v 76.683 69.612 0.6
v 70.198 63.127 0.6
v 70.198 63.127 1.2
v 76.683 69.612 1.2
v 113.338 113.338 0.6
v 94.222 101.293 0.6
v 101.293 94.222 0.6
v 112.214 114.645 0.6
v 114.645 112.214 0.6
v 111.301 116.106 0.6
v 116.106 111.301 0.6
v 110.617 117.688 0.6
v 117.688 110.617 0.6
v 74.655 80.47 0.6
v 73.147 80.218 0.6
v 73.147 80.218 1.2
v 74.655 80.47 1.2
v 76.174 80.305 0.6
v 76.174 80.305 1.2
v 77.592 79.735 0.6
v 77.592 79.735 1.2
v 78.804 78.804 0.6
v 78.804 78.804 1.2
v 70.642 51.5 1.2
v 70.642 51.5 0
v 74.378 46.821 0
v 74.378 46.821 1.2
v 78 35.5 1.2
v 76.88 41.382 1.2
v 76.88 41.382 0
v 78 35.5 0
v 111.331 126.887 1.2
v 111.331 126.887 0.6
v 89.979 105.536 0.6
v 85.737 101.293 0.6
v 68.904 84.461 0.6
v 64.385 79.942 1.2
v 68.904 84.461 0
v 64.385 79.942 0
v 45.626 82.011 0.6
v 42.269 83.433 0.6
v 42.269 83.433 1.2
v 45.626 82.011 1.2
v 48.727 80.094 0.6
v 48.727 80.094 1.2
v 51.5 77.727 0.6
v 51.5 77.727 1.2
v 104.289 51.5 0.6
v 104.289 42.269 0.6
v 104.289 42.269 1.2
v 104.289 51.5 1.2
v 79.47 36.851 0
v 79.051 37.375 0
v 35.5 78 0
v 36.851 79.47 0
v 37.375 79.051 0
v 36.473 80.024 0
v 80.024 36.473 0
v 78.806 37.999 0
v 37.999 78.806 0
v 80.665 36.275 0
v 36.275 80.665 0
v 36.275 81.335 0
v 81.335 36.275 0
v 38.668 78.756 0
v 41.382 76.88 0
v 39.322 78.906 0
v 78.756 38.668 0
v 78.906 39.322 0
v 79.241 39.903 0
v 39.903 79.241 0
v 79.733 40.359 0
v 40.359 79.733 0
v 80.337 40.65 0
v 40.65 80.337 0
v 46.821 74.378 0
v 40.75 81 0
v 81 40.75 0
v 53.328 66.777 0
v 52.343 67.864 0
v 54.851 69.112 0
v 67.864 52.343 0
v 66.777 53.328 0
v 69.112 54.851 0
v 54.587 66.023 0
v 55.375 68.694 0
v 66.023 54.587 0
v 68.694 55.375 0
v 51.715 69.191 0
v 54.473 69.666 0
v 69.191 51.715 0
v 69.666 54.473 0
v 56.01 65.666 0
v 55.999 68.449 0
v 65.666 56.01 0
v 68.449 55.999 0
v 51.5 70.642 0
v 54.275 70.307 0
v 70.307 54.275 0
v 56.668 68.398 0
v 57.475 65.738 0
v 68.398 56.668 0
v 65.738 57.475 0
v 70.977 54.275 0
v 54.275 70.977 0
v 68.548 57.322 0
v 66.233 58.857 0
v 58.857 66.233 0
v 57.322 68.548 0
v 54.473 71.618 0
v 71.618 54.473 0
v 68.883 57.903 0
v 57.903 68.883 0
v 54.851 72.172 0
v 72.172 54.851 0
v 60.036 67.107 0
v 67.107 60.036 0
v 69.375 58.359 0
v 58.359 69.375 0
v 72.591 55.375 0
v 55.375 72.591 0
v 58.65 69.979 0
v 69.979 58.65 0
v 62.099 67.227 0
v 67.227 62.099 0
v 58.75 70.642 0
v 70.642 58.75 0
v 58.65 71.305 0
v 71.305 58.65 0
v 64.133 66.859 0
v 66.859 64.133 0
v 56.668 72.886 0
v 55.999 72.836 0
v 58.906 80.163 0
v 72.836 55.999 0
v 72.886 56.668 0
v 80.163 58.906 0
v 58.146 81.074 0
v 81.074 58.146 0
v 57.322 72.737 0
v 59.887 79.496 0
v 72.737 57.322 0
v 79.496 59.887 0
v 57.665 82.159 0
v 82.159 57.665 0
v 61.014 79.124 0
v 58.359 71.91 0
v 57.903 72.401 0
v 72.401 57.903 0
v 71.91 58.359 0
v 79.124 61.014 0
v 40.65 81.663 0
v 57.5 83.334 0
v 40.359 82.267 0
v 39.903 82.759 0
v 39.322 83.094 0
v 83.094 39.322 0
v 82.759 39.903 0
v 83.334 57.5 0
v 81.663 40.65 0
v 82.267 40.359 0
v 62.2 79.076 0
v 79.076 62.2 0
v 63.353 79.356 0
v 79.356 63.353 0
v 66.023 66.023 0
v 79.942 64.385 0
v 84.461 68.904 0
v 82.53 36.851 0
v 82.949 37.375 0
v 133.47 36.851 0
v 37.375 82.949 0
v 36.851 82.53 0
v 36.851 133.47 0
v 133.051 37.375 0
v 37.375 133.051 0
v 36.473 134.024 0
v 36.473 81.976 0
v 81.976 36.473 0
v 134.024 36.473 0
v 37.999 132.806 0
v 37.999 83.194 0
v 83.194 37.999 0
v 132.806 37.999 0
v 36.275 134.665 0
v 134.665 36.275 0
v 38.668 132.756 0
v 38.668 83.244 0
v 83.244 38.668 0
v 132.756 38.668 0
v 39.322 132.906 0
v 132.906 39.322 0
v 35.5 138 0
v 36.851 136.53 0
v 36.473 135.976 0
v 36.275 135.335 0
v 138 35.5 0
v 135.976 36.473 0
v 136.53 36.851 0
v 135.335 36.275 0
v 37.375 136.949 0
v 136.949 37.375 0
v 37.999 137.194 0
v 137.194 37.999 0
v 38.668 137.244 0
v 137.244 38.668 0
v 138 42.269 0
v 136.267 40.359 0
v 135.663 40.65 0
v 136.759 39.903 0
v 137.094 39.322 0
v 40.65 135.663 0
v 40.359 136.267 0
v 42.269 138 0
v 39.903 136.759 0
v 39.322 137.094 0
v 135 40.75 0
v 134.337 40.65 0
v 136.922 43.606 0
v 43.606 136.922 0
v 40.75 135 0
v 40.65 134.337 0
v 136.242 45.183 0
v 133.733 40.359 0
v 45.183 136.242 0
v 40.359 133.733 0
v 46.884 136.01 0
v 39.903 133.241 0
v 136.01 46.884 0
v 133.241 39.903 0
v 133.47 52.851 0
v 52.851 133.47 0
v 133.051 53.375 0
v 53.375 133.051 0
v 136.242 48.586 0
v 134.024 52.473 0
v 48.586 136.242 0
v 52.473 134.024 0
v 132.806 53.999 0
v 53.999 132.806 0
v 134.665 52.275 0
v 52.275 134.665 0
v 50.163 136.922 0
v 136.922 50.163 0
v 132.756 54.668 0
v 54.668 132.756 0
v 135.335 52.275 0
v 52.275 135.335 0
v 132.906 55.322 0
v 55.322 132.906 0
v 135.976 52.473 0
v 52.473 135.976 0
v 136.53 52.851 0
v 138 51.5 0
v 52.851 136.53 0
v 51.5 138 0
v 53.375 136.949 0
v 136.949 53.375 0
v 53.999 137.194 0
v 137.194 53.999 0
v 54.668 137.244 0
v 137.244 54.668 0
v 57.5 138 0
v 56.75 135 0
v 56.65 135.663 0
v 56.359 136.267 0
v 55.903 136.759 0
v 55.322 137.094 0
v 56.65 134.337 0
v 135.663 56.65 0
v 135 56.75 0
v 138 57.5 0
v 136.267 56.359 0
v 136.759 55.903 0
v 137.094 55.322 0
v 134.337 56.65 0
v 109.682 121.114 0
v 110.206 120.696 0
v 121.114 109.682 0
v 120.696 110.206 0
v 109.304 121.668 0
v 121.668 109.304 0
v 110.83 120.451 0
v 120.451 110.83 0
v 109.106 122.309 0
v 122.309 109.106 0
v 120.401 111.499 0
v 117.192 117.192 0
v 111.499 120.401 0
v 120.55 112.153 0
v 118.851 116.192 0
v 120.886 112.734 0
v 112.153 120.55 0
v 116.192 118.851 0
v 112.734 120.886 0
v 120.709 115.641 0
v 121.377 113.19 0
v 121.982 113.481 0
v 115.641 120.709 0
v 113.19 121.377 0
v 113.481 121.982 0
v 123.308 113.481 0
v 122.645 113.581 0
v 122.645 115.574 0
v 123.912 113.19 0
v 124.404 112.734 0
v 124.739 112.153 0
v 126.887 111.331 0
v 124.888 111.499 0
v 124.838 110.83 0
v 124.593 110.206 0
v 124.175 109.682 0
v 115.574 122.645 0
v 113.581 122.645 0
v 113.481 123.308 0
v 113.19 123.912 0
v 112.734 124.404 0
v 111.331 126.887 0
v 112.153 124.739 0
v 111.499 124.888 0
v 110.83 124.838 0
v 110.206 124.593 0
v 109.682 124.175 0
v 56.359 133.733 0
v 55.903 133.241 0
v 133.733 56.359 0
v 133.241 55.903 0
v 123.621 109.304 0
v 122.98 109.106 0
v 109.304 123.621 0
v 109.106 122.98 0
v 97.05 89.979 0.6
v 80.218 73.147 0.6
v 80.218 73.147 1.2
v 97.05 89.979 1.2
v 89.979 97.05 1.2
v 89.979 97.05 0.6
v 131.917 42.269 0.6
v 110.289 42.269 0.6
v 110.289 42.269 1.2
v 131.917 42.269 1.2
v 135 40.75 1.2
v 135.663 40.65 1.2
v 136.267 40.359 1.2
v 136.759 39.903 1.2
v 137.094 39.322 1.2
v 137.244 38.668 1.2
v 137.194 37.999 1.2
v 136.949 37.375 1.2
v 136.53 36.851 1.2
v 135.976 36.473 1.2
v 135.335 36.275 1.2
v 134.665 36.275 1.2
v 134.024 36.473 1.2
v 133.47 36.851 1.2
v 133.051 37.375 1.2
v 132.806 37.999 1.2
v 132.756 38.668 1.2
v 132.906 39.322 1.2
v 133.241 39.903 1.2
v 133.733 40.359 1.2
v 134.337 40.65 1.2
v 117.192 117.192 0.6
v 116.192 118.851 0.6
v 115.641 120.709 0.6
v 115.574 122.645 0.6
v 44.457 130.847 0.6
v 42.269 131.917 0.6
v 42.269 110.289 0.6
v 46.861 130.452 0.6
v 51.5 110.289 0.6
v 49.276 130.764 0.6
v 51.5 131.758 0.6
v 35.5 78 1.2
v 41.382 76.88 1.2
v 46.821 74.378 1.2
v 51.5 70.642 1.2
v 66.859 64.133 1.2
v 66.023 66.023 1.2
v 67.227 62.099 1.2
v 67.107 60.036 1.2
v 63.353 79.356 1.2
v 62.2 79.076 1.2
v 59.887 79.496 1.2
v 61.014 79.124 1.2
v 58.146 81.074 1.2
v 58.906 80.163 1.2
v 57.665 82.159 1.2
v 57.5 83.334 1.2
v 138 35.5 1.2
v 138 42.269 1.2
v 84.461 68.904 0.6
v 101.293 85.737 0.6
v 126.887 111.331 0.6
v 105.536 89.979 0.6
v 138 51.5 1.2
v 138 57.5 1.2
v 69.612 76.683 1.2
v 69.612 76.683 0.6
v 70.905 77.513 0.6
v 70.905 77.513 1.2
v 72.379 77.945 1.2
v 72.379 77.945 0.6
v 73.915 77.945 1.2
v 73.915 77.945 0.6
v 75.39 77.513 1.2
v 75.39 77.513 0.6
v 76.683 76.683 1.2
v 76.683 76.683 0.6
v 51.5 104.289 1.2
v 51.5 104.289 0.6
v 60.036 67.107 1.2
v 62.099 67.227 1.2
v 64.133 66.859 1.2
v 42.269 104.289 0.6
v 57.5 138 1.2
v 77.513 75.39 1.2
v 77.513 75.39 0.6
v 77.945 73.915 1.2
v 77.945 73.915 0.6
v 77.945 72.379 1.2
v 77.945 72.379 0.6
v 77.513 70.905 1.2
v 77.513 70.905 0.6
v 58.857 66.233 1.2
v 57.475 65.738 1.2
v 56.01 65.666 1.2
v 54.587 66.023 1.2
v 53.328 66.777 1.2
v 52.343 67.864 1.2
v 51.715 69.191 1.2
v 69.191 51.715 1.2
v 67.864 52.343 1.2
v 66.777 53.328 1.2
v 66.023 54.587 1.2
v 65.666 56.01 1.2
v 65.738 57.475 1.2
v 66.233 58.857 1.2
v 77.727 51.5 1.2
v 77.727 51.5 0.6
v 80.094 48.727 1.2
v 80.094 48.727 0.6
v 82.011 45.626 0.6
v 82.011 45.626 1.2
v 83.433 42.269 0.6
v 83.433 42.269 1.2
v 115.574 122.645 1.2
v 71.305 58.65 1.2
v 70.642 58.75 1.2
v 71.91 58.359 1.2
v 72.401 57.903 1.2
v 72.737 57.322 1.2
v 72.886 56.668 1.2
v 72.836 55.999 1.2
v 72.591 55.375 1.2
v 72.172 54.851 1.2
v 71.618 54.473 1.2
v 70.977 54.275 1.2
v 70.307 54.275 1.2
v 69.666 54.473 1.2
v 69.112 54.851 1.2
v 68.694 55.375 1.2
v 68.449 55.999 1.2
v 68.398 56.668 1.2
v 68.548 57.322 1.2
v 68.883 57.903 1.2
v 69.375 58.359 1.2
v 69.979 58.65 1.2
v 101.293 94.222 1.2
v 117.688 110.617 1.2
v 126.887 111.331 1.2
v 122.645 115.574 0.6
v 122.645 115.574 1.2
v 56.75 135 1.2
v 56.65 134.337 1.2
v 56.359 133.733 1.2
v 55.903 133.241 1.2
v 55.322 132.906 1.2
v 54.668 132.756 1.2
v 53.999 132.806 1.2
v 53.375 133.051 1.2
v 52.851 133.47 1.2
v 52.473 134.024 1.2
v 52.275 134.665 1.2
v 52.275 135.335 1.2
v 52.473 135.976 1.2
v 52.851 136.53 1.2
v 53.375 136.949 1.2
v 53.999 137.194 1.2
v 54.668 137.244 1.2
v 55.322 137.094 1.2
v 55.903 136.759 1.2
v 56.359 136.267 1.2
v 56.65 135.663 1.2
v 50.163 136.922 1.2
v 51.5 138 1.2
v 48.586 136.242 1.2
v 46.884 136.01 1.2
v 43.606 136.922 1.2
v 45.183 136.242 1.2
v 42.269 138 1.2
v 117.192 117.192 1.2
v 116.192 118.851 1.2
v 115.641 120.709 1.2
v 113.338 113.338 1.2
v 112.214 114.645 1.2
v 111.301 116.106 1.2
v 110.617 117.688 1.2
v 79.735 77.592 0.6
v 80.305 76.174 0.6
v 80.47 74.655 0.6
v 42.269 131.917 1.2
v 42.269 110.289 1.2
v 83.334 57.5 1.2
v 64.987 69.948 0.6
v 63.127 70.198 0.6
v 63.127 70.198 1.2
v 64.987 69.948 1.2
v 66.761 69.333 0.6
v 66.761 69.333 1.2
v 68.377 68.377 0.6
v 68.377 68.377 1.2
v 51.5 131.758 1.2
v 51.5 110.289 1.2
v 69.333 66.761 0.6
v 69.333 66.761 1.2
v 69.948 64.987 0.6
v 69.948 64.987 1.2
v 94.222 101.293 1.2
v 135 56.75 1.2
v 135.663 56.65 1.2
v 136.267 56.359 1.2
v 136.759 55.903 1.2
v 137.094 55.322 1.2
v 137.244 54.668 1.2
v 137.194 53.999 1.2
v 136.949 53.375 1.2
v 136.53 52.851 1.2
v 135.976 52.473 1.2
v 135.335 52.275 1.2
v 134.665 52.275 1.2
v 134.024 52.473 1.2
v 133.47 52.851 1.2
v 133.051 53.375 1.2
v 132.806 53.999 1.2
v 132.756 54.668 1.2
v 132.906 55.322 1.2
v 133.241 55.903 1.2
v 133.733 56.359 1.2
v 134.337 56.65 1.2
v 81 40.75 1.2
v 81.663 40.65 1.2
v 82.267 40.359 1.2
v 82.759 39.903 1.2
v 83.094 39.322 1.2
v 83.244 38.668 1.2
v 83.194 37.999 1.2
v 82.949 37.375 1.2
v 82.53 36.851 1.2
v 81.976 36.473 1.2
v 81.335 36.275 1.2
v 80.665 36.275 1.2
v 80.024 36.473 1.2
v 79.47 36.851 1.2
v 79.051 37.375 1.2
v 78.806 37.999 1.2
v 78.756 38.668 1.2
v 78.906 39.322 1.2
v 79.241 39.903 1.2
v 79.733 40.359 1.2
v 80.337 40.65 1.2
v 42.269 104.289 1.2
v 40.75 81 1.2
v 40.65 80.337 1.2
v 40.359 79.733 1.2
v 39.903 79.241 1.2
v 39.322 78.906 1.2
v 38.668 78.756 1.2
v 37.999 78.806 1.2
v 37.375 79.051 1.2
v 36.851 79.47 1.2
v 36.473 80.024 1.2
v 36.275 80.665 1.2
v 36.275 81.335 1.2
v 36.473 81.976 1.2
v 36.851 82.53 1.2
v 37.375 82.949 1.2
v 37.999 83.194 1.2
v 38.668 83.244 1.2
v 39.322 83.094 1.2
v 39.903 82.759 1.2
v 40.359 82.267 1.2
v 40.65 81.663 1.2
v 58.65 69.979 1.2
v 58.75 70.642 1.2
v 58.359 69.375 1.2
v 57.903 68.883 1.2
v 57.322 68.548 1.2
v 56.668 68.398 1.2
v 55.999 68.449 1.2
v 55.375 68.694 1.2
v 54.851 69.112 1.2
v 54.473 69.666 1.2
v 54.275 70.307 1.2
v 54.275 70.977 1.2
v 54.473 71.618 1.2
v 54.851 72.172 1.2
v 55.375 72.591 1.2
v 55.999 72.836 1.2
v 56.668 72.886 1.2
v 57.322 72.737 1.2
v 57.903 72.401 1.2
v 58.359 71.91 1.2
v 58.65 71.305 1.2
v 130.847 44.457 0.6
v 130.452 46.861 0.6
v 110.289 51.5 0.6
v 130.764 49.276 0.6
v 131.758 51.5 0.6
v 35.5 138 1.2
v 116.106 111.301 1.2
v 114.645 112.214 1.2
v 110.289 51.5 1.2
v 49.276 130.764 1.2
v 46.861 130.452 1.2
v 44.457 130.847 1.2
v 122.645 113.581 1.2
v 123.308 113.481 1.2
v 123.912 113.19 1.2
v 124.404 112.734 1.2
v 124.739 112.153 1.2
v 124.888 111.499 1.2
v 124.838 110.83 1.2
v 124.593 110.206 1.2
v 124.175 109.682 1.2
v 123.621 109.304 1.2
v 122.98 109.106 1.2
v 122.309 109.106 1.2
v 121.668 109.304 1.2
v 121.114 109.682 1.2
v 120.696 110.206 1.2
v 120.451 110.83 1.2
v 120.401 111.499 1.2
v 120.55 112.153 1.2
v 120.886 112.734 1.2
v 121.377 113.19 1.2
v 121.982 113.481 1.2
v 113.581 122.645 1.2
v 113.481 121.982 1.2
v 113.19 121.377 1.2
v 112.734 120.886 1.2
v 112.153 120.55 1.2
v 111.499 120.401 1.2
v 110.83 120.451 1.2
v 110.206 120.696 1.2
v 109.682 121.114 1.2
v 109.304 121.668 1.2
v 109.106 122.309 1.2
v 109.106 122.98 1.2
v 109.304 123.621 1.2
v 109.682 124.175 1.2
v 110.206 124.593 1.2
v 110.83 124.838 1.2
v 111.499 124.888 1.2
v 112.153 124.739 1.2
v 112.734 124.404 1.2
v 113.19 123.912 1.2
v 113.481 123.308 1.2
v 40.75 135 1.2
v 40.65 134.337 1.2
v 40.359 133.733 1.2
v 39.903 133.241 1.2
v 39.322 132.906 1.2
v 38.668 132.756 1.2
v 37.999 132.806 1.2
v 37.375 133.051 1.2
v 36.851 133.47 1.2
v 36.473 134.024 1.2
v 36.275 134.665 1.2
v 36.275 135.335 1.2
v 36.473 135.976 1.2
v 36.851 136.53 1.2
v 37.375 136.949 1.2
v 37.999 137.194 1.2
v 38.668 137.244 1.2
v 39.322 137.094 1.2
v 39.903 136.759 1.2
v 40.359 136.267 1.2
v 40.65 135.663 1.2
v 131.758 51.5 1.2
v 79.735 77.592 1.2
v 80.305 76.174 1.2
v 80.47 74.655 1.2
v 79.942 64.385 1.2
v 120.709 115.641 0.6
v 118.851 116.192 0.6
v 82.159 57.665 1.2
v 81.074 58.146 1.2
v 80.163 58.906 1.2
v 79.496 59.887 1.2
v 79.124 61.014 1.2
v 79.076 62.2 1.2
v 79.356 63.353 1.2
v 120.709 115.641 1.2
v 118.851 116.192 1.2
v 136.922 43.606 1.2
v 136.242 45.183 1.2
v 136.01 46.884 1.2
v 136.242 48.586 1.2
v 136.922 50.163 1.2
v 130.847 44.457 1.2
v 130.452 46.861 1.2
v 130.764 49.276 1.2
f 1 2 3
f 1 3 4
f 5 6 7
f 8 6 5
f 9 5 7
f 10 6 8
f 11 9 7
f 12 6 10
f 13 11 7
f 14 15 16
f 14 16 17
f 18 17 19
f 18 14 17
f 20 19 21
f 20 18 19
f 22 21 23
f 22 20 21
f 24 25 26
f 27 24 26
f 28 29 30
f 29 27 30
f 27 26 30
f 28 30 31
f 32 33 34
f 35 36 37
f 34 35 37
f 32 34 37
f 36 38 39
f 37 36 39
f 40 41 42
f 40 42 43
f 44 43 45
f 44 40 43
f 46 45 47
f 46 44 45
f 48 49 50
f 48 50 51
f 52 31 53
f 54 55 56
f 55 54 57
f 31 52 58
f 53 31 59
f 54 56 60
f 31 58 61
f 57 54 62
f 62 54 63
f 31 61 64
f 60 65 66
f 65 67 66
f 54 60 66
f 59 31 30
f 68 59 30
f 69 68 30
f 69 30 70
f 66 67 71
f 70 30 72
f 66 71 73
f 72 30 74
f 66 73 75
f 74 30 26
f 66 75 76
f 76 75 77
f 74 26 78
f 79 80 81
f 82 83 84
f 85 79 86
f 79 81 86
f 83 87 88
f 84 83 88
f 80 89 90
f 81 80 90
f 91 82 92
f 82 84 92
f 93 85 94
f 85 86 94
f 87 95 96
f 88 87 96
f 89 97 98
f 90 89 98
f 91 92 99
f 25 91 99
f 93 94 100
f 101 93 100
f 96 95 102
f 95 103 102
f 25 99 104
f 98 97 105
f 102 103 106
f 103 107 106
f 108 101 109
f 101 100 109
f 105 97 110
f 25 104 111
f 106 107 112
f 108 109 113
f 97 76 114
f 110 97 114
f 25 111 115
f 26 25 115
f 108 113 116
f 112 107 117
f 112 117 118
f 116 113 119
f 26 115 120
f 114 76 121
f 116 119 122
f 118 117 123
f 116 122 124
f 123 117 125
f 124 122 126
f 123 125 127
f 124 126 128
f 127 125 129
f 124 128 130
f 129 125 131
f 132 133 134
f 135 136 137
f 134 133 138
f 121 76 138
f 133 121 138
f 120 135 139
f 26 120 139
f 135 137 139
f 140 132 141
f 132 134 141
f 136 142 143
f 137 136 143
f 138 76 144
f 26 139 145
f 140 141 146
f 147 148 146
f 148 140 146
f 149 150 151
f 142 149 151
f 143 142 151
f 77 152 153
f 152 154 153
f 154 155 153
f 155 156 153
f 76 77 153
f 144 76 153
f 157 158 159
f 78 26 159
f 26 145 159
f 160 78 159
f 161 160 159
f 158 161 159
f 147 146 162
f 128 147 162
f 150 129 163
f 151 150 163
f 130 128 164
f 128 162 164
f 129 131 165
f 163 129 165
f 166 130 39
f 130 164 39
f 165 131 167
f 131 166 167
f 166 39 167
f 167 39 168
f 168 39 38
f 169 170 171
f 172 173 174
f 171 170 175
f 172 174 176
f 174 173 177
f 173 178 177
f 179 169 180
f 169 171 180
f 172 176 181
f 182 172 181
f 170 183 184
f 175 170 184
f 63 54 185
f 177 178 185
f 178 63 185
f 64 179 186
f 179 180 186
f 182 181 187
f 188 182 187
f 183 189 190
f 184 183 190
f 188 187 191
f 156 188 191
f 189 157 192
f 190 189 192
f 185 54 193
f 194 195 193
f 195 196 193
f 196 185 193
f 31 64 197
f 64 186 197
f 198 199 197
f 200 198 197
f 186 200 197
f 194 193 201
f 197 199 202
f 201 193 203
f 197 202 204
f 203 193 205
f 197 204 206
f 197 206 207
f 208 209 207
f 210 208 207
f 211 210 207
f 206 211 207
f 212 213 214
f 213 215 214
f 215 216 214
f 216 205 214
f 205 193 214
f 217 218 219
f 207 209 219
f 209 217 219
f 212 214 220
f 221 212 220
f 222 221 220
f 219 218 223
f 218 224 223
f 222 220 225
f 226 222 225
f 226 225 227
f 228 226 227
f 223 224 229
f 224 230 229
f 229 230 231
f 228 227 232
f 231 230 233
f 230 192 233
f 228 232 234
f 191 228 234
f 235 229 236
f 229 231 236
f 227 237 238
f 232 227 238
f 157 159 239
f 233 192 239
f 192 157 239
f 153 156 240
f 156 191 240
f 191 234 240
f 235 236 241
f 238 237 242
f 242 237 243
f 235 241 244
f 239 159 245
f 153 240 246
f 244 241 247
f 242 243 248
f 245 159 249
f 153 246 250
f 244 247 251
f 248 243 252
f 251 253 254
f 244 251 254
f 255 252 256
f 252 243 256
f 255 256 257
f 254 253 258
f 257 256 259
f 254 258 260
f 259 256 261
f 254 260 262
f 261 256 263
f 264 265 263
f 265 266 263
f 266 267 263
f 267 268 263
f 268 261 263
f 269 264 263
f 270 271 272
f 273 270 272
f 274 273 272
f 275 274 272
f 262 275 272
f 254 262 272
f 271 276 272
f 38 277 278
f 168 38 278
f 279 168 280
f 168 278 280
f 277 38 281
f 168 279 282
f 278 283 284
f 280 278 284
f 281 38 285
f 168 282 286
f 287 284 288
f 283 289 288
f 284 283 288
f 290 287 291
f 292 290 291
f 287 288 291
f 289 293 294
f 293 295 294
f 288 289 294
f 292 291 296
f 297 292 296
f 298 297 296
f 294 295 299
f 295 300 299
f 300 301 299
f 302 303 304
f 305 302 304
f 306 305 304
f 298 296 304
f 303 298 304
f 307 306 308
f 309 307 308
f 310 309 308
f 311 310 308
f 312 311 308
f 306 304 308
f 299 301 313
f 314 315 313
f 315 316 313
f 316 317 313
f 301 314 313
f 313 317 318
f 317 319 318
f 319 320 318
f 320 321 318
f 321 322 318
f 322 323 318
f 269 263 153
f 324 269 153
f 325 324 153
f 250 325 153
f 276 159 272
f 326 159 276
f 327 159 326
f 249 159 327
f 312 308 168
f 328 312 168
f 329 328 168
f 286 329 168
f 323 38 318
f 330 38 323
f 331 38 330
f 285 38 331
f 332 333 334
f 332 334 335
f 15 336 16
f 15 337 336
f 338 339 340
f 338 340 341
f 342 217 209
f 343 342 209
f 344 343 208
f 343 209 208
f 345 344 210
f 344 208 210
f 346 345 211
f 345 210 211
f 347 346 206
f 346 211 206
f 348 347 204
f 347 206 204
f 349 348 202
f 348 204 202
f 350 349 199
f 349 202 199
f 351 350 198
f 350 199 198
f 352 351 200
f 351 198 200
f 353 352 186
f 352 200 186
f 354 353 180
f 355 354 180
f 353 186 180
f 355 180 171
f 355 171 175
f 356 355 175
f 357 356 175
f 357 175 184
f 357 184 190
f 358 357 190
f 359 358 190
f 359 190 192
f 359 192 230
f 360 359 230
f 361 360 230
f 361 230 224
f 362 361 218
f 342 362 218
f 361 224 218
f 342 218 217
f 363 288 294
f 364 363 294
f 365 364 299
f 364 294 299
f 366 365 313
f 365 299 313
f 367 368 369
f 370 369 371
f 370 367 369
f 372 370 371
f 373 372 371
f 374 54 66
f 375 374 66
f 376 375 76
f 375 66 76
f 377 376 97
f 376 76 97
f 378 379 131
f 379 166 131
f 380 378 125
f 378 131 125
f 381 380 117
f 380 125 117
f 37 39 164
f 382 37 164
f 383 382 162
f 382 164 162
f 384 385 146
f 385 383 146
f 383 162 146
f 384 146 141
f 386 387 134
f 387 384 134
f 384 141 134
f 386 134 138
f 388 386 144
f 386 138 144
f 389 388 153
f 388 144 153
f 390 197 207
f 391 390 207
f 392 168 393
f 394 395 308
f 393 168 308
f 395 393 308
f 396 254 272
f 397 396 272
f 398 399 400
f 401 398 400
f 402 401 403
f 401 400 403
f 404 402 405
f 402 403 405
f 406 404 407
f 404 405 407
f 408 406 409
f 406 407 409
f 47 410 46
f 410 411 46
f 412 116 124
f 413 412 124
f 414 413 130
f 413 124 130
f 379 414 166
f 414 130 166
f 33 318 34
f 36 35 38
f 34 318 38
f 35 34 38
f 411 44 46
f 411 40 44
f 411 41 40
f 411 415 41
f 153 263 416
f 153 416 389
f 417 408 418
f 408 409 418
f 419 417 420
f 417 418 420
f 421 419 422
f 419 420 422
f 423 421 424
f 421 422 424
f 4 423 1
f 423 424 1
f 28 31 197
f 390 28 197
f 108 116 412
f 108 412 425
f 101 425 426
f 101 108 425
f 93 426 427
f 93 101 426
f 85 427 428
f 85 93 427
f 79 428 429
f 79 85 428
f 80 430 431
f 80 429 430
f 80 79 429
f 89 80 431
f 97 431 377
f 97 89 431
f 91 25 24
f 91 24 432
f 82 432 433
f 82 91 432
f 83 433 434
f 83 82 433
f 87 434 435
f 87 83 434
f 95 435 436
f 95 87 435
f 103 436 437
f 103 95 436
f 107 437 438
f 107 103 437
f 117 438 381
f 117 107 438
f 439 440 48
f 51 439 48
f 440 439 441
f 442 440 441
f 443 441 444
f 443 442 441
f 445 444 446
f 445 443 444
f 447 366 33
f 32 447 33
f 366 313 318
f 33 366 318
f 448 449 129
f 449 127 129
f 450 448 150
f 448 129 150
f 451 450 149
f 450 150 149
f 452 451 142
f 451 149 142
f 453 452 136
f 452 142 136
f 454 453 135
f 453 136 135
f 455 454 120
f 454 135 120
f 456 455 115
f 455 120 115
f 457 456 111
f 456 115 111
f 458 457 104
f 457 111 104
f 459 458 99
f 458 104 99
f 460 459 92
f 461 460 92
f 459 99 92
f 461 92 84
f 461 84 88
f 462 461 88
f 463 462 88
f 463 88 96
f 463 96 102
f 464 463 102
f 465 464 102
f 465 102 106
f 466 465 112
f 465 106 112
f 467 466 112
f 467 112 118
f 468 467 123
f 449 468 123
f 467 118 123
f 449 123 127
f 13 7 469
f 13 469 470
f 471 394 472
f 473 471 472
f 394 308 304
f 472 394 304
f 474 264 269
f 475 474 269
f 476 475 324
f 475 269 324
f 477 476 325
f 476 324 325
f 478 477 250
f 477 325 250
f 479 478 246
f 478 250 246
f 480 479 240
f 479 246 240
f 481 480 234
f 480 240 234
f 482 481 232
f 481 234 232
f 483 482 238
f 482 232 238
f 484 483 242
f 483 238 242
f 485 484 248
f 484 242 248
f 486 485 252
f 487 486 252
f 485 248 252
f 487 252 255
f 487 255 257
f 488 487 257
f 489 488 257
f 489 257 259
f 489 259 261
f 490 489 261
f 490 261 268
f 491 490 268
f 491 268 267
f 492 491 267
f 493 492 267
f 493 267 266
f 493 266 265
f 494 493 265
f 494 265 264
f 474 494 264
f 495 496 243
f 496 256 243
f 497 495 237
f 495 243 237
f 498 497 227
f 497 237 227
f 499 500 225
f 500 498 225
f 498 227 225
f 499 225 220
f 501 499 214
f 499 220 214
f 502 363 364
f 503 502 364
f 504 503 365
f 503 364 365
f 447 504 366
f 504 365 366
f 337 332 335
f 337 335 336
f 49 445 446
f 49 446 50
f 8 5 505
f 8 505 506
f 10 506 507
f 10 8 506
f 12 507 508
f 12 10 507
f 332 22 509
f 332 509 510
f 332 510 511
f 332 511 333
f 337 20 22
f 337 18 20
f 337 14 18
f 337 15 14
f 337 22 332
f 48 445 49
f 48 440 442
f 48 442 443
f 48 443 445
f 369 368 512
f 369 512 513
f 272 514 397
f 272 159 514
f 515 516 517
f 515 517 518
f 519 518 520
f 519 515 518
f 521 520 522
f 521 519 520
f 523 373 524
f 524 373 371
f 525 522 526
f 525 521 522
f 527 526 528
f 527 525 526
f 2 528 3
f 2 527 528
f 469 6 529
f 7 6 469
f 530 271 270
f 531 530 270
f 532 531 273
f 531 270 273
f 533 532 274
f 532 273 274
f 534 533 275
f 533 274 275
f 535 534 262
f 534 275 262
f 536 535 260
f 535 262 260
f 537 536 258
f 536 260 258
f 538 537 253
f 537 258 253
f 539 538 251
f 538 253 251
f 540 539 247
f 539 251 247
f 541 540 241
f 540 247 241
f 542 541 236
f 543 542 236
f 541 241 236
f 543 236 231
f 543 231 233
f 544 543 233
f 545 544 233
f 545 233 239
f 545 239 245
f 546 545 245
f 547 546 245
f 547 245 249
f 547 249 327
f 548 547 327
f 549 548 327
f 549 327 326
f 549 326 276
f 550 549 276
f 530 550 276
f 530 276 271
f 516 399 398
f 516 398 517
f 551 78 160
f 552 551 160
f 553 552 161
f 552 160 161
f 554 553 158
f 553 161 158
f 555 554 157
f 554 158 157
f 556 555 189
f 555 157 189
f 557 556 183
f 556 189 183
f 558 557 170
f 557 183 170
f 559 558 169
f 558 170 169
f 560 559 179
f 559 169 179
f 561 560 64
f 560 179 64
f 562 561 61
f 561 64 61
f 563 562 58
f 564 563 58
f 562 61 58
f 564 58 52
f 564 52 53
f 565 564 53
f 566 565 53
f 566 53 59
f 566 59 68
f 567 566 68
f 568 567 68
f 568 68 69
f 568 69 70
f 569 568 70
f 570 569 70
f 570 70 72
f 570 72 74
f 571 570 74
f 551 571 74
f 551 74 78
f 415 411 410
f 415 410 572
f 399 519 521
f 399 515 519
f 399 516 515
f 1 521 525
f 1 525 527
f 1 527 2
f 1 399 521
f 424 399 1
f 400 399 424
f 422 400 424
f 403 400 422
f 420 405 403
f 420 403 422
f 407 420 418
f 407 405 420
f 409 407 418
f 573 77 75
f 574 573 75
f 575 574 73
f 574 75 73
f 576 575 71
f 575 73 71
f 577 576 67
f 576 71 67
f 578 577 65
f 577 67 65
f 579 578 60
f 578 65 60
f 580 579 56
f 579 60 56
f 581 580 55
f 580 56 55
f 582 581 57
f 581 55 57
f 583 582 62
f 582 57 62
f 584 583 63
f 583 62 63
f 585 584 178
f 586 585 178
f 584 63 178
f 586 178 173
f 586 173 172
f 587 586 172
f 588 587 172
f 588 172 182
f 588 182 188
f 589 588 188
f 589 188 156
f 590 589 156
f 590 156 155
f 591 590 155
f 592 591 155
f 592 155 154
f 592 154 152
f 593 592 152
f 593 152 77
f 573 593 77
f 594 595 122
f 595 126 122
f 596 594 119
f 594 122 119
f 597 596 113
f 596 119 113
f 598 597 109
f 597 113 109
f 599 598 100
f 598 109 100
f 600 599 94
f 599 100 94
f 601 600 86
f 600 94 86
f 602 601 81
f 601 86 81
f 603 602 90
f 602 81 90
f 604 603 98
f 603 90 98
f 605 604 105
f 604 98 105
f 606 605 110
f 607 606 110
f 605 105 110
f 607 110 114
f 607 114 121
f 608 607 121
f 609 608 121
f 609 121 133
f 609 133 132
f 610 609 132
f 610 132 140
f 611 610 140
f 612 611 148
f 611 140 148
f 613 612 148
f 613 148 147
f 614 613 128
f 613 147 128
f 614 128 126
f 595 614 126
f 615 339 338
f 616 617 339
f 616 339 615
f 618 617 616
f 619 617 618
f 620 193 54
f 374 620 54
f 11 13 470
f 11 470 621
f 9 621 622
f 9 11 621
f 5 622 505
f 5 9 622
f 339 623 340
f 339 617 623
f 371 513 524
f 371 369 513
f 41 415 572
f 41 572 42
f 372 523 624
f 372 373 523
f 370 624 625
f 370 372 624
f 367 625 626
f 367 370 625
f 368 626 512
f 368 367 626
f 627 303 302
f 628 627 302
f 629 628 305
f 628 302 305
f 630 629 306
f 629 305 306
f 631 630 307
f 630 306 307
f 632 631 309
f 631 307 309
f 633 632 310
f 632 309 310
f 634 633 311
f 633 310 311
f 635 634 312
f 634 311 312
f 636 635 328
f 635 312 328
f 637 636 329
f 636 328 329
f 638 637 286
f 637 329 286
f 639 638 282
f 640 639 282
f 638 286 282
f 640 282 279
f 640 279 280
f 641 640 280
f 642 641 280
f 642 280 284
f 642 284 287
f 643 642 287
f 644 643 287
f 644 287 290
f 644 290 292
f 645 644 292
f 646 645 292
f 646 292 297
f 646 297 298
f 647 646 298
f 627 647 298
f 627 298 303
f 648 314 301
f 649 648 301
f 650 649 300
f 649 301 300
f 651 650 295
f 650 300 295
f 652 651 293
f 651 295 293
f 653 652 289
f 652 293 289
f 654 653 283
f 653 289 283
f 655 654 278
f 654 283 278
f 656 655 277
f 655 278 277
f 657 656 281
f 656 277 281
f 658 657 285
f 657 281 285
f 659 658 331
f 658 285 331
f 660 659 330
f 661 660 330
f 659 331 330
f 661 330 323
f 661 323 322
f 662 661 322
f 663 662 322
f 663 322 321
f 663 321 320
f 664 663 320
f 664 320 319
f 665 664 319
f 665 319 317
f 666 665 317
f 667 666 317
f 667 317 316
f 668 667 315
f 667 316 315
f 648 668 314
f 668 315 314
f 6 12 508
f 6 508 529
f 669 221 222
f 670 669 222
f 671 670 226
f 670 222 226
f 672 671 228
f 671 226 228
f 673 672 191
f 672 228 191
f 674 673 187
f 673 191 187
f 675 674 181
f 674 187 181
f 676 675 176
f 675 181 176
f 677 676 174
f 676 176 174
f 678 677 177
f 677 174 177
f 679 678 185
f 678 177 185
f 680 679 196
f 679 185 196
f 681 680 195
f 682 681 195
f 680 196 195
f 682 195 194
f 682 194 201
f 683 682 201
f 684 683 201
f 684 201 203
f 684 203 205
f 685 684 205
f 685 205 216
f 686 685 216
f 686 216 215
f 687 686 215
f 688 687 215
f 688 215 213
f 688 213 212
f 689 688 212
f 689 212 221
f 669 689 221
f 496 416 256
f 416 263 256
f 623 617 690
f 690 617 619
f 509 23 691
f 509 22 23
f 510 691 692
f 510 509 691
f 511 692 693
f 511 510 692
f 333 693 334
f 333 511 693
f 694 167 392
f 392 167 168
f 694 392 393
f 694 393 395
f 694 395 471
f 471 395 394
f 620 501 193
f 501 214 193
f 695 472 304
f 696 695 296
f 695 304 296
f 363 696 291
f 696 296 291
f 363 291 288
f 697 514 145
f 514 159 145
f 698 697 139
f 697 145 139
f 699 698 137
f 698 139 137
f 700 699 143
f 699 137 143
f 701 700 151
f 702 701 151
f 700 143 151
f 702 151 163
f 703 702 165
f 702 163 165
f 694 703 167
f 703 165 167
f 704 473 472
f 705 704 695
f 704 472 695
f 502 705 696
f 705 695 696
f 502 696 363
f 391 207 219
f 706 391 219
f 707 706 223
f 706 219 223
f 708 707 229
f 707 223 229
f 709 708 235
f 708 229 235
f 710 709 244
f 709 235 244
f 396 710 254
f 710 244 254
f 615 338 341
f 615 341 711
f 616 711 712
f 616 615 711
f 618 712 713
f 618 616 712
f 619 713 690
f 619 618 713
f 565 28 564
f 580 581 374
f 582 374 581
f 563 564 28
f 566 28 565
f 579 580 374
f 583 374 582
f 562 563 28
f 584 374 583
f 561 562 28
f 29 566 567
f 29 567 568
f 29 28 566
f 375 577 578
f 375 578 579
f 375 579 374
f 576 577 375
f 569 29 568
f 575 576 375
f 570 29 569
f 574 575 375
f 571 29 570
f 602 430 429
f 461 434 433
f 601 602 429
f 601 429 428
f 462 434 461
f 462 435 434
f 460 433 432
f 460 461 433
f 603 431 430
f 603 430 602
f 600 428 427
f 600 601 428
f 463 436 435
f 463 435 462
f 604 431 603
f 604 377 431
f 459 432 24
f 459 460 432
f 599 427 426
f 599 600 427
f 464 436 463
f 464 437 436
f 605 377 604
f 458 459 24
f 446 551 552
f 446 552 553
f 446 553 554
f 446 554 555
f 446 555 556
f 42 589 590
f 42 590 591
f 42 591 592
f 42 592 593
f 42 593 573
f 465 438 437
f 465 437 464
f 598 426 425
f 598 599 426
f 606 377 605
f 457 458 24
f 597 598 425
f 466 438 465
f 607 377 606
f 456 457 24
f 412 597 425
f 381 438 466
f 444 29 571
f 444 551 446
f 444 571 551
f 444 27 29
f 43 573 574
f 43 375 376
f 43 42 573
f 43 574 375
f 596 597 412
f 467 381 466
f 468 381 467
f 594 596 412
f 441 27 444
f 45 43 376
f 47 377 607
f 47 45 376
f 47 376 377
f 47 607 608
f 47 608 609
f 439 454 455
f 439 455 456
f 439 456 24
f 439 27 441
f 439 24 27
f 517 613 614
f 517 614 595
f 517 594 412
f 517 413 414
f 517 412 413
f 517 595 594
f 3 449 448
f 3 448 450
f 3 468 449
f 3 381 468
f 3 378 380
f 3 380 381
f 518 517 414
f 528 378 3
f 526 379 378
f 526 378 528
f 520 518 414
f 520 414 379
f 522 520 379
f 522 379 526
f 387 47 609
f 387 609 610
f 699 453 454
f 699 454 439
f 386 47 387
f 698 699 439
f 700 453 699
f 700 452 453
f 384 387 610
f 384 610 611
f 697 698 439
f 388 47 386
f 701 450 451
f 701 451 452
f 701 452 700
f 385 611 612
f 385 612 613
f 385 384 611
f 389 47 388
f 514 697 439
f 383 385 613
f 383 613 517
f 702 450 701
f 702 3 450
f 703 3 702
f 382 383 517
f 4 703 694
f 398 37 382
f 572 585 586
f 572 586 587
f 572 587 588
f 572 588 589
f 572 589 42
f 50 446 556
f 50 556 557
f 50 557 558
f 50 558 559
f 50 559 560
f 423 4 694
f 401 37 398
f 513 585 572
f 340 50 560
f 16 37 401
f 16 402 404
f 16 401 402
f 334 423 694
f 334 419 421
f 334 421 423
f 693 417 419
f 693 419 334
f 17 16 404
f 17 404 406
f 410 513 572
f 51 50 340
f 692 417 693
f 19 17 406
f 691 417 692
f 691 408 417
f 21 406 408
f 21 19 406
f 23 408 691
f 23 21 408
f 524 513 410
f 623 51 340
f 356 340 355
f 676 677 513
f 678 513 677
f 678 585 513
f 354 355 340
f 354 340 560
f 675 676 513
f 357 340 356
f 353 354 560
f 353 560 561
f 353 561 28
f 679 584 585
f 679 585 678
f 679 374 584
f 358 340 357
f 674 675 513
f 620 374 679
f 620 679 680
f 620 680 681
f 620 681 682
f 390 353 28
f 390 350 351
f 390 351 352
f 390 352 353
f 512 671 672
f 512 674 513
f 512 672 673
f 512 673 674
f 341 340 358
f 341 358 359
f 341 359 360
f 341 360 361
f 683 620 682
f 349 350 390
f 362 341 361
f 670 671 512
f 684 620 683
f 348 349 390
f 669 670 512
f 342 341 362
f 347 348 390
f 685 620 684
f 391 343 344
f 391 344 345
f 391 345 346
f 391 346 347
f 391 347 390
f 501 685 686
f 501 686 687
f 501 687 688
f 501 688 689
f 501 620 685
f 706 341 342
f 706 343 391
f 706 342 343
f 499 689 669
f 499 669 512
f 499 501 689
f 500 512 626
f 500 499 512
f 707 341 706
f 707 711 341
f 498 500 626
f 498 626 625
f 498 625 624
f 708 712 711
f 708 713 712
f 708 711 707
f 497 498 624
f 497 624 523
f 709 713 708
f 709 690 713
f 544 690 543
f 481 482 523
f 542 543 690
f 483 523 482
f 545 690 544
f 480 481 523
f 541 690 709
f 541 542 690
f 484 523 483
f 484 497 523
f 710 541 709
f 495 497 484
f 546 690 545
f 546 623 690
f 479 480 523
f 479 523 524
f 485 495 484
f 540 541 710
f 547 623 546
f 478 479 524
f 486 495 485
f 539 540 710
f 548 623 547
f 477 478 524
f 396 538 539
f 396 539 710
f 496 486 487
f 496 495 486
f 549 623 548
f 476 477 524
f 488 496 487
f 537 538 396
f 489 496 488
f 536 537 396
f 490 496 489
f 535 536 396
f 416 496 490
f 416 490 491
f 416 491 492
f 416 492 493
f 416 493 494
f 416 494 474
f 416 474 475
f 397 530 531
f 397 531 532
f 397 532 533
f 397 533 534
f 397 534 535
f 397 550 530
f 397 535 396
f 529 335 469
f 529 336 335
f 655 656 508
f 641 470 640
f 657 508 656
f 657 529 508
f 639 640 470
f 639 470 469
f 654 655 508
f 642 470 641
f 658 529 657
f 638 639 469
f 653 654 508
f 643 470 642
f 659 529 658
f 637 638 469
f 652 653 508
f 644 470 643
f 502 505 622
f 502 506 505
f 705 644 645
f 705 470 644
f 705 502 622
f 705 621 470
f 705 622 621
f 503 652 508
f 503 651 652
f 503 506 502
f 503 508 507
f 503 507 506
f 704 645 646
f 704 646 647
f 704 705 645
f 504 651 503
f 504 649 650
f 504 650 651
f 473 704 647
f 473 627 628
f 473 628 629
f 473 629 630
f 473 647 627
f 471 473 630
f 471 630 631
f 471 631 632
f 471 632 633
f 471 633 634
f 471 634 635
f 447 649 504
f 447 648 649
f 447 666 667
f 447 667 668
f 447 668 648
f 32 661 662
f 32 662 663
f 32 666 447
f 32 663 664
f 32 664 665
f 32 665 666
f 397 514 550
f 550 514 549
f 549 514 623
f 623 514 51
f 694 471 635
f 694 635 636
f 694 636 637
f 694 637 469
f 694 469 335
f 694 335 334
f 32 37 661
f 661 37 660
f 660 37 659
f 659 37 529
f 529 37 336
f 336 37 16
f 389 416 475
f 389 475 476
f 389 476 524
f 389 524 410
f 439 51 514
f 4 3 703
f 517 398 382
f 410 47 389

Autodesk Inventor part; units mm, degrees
ref_plane "YZ Plane" through (0, 0, 0) normal (1, 0, 0) x (0, 1, 0)
ref_plane "XZ Plane" through (0, 0, 0) normal (0, 1, 0) x (-1, 0, 0)
sketch "Sketch1" plane through (0, 0, 0) normal (0, 0, 1) x (1, 0, 0)
  line L0 (-41.5, 58) -> (41.5, 58)
  line L1 (41.5, 58) -> (41.5, 158)
  line L2 (41.5, 158) -> (-41.5, 158)
  line L3 (-41.5, 158) -> (-41.5, 58)
  line L4 (58, 41.5) -> (158, 41.5)
  line L5 (158, 41.5) -> (158, -41.5)
  line L6 (158, -41.5) -> (58, -41.5)
  line L7 (58, -41.5) -> (58, 41.5)
  line L8 (-131.1952, 0) -> (204.4844, 0) construction
  line L9 (-48, 48) -> (48, 48)
  line L10 (48, 48) -> (48, -48)
  line L11 (48, -48) -> (-48, -48)
  line L12 (-48, -48) -> (-48, 48)
  line L13 (0, 180.9439) -> (0, -136.3054) construction
  point P0 (0, 0)
  point P1 (-48, 0)
  point P2 (0, 48)
  point P3 (0, 58)
  point P4 (58, 0)
  dimension "d0" = 83
  dimension "d1" = 100
  dimension "d2" = 100
  dimension "d3" = 83
  dimension "d5" = 96
  dimension "d6" = 96
  dimension "d7" = 10
  dimension "d8" = 10
sketch "Sketch2" plane through (0, 0, 0) normal (0, 0, 1) x (1, 0, 0)
  line L0 (41.5, 158) -> (-41.5, 158) projected
  line L1 (41.5, 58) -> (41.5, 158) projected
  line L2 (-48, 48) -> (48, 48) projected
  line L3 (48, 48) -> (48, -48) projected
  line L4 (58, -41.5) -> (58, 41.5) projected
  line L5 (58, 41.5) -> (158, 41.5) projected
  line L6 (-41.5, 58) -> (41.5, 58) projected
  line L7 (158, 41.5) -> (158, -41.5) projected
  line L8 (48, 48) -> (136.7868, 136.7868) construction
  line L9 (35.5, 78) -> (57.5, 78)
  line L10 (57.5, 78) -> (57.5, 138)
  line L11 (57.5, 138) -> (35.5, 138)
  line L12 (35.5, 138) -> (35.5, 78)
  line L13 (41.5, 108) -> (-41.5, 108) construction
  line L14 (108, 41.5) -> (108, -41.5) construction
  line L15 (41.5, 158) -> (220.1006, 158) construction
  line L16 (158, 41.5) -> (158, 206.0131) construction
  line L17 (115.5736, 158) -> (158, 115.5736) construction
  line L18 (41.5, 138) -> (41.5, 78) construction
  line L19 (51.5, 138) -> (51.5, 78) construction
  line L20 (46.5, 138) -> (46.5, 78) construction
  line L21 (51.5, 158) -> (51.5, 70.6421)
  line L22 (60.0355, 67.1066) -> (133.2513, 140.3223)
  arc A0 (51.5, 158) -> (133.2513, 140.3223) centre (109.2071, 226.9991) ccw
  line L23 (68.9045, 84.4609) -> (84.4609, 68.9045)
  line L24 (84.4609, 68.9045) -> (126.8873, 111.331)
  line L25 (126.8873, 111.331) -> (111.331, 126.8873)
  line L26 (111.331, 126.8873) -> (68.9045, 84.4609)
  line L27 (80.2183, 73.1472) -> (122.6447, 115.5736) construction
  line L28 (105.6741, 90.1177) -> (90.1177, 105.6741) construction
  line L29 (73.1472, 80.2183) -> (115.5736, 122.6447) construction
  line L30 (76.6827, 76.6827) -> (119.1091, 119.1091) construction
  circle A1 centre (73.1472, 84.4609) radius 2.25
  circle A2 centre (111.331, 122.6447) radius 2.25
  circle A3 centre (84.4609, 73.1472) radius 2.25
  circle A4 centre (122.6447, 111.331) radius 2.25
  circle A5 centre (38.5, 135) radius 2.25
  circle A6 centre (38.5, 81) radius 2.25
  circle A7 centre (54.5, 135) radius 2.25
  circle A8 centre (54.5, 81) radius 2.25
  arc A9 (51.5, 70.6421) -> (60.0355, 67.1066) centre (56.5, 70.6421) ccw
  point P0 (0, 0)
  point P1 (158, 158)
  dimension "d23" = 30
  dimension "d25" = 45
  dimension "d30" = 10
  dimension "d37" = 10
  dimension "d38" = 60
  dimension "d39" = 4.5
  dimension "d40" = 3
  dimension "d42" = 4.5
  dimension "d43" = 3
  dimension "d46" = 60
  dimension "d47" = 30
  dimension "d48" = 4.5
  dimension "d49" = 3
  dimension "d50" = 3
  dimension "d51" = 4.5
  dimension "d52" = 3
  dimension "d53" = 3
  dimension "d54" = 5
  dimension "d55" = 25
  dimension "d57" = 3
  dimension "d58" = 3
  dimension "d59" = 3
  dimension "d60" = 3
sketch "Sketch6" plane through (0, 0, 0) normal (0, 0, 1) x (1, 0, 0)
  line L0 (57.5, 138) -> (35.5, 138) projected
  line L1 (35.5, 138) -> (35.5, 78) projected
  line L2 (35.5, 78) -> (57.5, 78) projected
  circle A0 centre (38.5, 81) radius 2.25 projected
  circle A1 centre (38.5, 135) radius 2.25 projected
  circle A2 centre (54.5, 135) radius 2.25 projected
  line L3 (111.331, 126.8873) -> (68.9045, 84.4609) projected
  circle A3 centre (111.331, 122.6447) radius 2.25 projected
  line L4 (126.8873, 111.331) -> (111.331, 126.8873) projected
  line L5 (84.4609, 68.9045) -> (126.8873, 111.331) projected
  line L6 (68.9045, 84.4609) -> (84.4609, 68.9045) projected
  line L7 (60.0355, 67.1066) -> (133.2513, 140.3223) projected
  arc A4 (51.5, 70.6421) -> (60.0355, 67.1066) centre (56.5, 70.6421) ccw projected
  line L8 (51.5, 158) -> (51.5, 70.6421) projected
  arc A5 (51.5, 158) -> (133.2513, 140.3223) centre (109.2071, 226.9991) ccw projected
  line L9 (119.1091, 119.1091) -> (76.6827, 76.6827) construction
  circle A6 centre (38.5, 135) radius 2.25
  circle A7 centre (38.5, 81) radius 2.25
  circle A8 centre (54.5, 135) radius 2.25
  circle A9 centre (111.331, 122.6447) radius 2.25
  circle A10 centre (56.5, 70.6421) radius 2.25
  line L10 (57.5, 138) -> (51.5, 138)
  line L11 (35.5, 138) -> (35.5, 78)
  line L12 (57.5, 138) -> (57.5, 83.3339)
  line L13 (111.331, 126.8873) -> (64.3853, 79.9416)
  line L14 (111.331, 126.8873) -> (115.5736, 122.6447)
  line L15 (126.8873, 111.331) -> (84.4609, 68.9045)
  arc A11 (51.5, 70.6421) -> (60.0355, 67.1066) centre (56.5, 70.6421) ccw
  arc A12 (51.5, 70.6421) -> (35.5, 78) centre (33.8506, 53.3381) ccw
  arc A13 (42.2688, 138) -> (51.5, 138) centre (46.8844, 142.3576) ccw
  line L16 (42.2688, 138) -> (35.5, 138)
  arc A14 (115.5736, 122.6447) -> (123.8972, 114.3211) centre (123.1928, 121.9402) ccw
  line L17 (123.8972, 114.3211) -> (126.8873, 111.331)
  arc A15 (57.5, 83.3339) -> (64.3853, 79.9416) centre (61.7783, 83.3339) ccw
  arc A16 (66.0227, 66.0227) -> (60.0355, 67.1066) centre (61.5732, 58.5223) ccw
  line L18 (66.0227, 66.0227) -> (76.6827, 76.6827)
  line L19 (76.6827, 76.6827) -> (84.4609, 68.9045)
  point P0 (0, 0)
  point P1 (69.6117, 76.6827)
  dimension "d99" = 4.5
extrude "Extrusion13" add sketch "Sketch6" along normal blind 0.6 contours L12 A15 L13 L6 L7 A4 L8 L0 | L8 L2 L1 L0 A13 | L8 A12 L2 | L3 L4 L7 L6 | A14 L4 L5 L6 L7 | L7 L6 L18 A16 | A2 | A3 | A10
ref_plane "Work Plane5" through (119.1091, 119.1091, 0) normal (-0.7071, 0.7071, 0) x (-0.7071, -0.7071, 0)
mirror "Mirror3" about plane through (119.1091, 119.1091, 0) normal (-0.7071, 0.7071, 0) of "Extrusion13"
extrude "Extrusion14" cut sketch "Sketch6" along normal blind 0.6 contours A3
mirror "Mirror4" about plane through (119.1091, 119.1091, 0) normal (-0.7071, 0.7071, 0) of "Extrusion14"
sketch "Sketch8" plane through (0, 0, 0.6) normal (0, 0, 1) x (1, 0, 0)
  line L0 (57.5, 138) -> (51.5, 138) projected
  arc A0 (51.5, 70.6421) -> (60.0355, 67.1066) centre (56.5, 70.6421) ccw projected
  line L1 (57.5, 138) -> (51.5, 138)
  line L2 (51.5, 138) -> (51.5, 70.6421)
  line L3 (51.5, 70.6421) -> (57.5, 70.6421)
  line L4 (57.5, 70.6421) -> (57.5, 138)
  line L5 (35.5, 138) -> (35.5, 78) projected
  line L6 (35.5, 138) -> (42.2688, 138)
  line L7 (42.2688, 138) -> (42.2688, 76.5774)
  line L8 (42.2688, 76.5774) -> (35.5, 76.5774)
  line L9 (35.5, 76.5774) -> (35.5, 138)
  arc A1 (51.5, 70.6421) -> (35.5, 78) centre (33.8506, 53.3381) ccw projected
  arc A2 (42.2688, 131.917) -> (51.5, 131.7579) centre (47.0049, 138.8311) ccw
  line L10 (35.5, 107.2887) -> (57.5, 107.2887) construction
  line L11 (57.5, 83.3339) -> (57.5, 138) projected
  line L12 (35.5, 110.2887) -> (57.5, 110.2887)
  line L13 (57.5, 110.2887) -> (57.5, 104.2887)
  line L14 (57.5, 104.2887) -> (35.5, 104.2887)
  line L15 (35.5, 104.2887) -> (35.5, 110.2887)
  line L16 (111.331, 126.8873) -> (115.5736, 122.6447)
  line L17 (115.5736, 122.6447) -> (60.0355, 67.1066)
  line L18 (60.0355, 67.1066) -> (55.7929, 71.3492)
  line L19 (55.7929, 71.3492) -> (111.331, 126.8873)
  line L20 (64.3853, 79.9416) -> (111.331, 126.8873) projected
  line L21 (64.3853, 79.9416) -> (111.331, 126.8873) projected
  line L22 (87.8581, 103.4145) -> (103.4145, 87.8581) construction
  line L23 (79.9416, 64.3853) -> (126.8873, 111.331) projected
  line L24 (89.9794, 105.5358) -> (105.5358, 89.9794)
  line L25 (105.5358, 89.9794) -> (101.2931, 85.7368)
  line L26 (101.2931, 85.7368) -> (85.7368, 101.2931)
  line L27 (85.7368, 101.2931) -> (89.9794, 105.5358)
  arc A3 (51.5, 70.6421) -> (60.0355, 67.1066) centre (56.5, 70.6421) ccw
  arc A4 (57.5, 83.3339) -> (64.3853, 79.9416) centre (61.7783, 83.3339) ccw projected
  arc A5 (57.5, 83.3339) -> (64.3853, 79.9416) centre (61.7783, 83.3339) ccw
  arc A6 (76.6827, 76.6827) -> (69.6117, 76.6827) centre (73.1472, 72.5977) ccw
  line L28 (76.6827, 76.6827) -> (78.804, 78.804)
  arc A7 (78.804, 78.804) -> (73.1472, 80.2183) centre (74.8151, 74.869) ccw
  line L29 (42.2688, 131.917) -> (42.2688, 138)
  line L30 (51.5, 131.7579) -> (51.5, 138)
  line L31 (73.1472, 80.2183) -> (69.6117, 76.6827)
  line L32 (126.8873, 111.331) -> (122.6447, 115.5736) projected
  arc A8 (117.1923, 117.1923) -> (122.6447, 115.5736) centre (121.9402, 123.1928) ccw projected
  arc A9 (115.5736, 122.6447) -> (122.6447, 115.5736) centre (121.4114, 121.4114) ccw
  arc A10 (110.6174, 117.6885) -> (113.3377, 113.3377) centre (121.4114, 121.4114) ccw
  arc A11 (115.5736, 122.6447) -> (117.1923, 117.1923) centre (123.1928, 121.9402) ccw projected
  line L33 (111.331, 126.8873) -> (115.5736, 122.6447) projected
  line L34 (115.5736, 122.6447) -> (110.6174, 117.6885)
  arc A12 (51.5, 77.7274) -> (35.5, 84.6602) centre (34.6745, 60.8256) ccw
  line L35 (35.5, 85.7368) -> (35.5, 78)
  line L36 (51.5, 78.804) -> (51.5, 70.6421)
  arc A13 (51.5, 70.6421) -> (35.5, 78) centre (33.8506, 53.3381) ccw
  arc A14 (42.2688, 138) -> (51.5, 138) centre (46.8844, 142.3576) ccw projected
  line L37 (42.2688, 138) -> (35.5, 138) projected
  arc A15 (42.2688, 138) -> (51.5, 138) centre (46.8844, 142.3576) ccw
  line L38 (117.1923, 117.1923) -> (113.3377, 113.3377)
  arc A16 (68.3773, 68.3773) -> (63.1267, 70.1978) centre (62.8115, 60.8068) ccw
  arc A17 (66.0227, 66.0227) -> (60.0355, 67.1066) centre (61.5732, 58.5223) ccw projected
  line L39 (68.3773, 68.3773) -> (66.0227, 66.0227)
  line L40 (57.5, 138) -> (57.5, 83.3339) projected
  line L41 (57.5, 83.3339) -> (57.5, 73.0563)
  line L42 (57.5, 73.0563) -> (64.3853, 79.9416)
  point P0 (0, 0)
  point P1 (35.5, 107.2887)
  dimension "d114" = 6
  dimension "d117" = 3
extrude "Extrusion15" add sketch "Sketch8" along normal blind 0.6 contours L4 L12 L2 L0 | L2 A2 L7 A14 | L4 L14 L2 L12 | L7 L12 L5 L6 | L4 L19 L18 L3 L2 L14 | L2 L14 L7 L12 | A4 L19 L4 | L7 L14 L5 L12 | L19 L26 L17 L18 L3 L4 | L4 L3 L18 L19 | L7 A12 L5 L14 | L19 L24 L17 L26 | L2 A1 L7 A12 | L7 A1 L5 A12 | L18 A0 L3 | L19 L16 L17 L24 | L17 L24 L23 L26 | L17 A16 L39 A17 | A7 L28 A6 L17 | A9 L38 A10 L17 | A11 A9
extrude "Extrusion16" cut sketch "Sketch6" along normal blind 3 contours A0 | A1 | A2 | A3 | A10
mirror "Mirror5" about plane through (119.1091, 119.1091, 0) normal (-0.7071, 0.7071, 0) of "Extrusion15", "Extrusion16"
properties part number "SolarFolds_Sketch"
